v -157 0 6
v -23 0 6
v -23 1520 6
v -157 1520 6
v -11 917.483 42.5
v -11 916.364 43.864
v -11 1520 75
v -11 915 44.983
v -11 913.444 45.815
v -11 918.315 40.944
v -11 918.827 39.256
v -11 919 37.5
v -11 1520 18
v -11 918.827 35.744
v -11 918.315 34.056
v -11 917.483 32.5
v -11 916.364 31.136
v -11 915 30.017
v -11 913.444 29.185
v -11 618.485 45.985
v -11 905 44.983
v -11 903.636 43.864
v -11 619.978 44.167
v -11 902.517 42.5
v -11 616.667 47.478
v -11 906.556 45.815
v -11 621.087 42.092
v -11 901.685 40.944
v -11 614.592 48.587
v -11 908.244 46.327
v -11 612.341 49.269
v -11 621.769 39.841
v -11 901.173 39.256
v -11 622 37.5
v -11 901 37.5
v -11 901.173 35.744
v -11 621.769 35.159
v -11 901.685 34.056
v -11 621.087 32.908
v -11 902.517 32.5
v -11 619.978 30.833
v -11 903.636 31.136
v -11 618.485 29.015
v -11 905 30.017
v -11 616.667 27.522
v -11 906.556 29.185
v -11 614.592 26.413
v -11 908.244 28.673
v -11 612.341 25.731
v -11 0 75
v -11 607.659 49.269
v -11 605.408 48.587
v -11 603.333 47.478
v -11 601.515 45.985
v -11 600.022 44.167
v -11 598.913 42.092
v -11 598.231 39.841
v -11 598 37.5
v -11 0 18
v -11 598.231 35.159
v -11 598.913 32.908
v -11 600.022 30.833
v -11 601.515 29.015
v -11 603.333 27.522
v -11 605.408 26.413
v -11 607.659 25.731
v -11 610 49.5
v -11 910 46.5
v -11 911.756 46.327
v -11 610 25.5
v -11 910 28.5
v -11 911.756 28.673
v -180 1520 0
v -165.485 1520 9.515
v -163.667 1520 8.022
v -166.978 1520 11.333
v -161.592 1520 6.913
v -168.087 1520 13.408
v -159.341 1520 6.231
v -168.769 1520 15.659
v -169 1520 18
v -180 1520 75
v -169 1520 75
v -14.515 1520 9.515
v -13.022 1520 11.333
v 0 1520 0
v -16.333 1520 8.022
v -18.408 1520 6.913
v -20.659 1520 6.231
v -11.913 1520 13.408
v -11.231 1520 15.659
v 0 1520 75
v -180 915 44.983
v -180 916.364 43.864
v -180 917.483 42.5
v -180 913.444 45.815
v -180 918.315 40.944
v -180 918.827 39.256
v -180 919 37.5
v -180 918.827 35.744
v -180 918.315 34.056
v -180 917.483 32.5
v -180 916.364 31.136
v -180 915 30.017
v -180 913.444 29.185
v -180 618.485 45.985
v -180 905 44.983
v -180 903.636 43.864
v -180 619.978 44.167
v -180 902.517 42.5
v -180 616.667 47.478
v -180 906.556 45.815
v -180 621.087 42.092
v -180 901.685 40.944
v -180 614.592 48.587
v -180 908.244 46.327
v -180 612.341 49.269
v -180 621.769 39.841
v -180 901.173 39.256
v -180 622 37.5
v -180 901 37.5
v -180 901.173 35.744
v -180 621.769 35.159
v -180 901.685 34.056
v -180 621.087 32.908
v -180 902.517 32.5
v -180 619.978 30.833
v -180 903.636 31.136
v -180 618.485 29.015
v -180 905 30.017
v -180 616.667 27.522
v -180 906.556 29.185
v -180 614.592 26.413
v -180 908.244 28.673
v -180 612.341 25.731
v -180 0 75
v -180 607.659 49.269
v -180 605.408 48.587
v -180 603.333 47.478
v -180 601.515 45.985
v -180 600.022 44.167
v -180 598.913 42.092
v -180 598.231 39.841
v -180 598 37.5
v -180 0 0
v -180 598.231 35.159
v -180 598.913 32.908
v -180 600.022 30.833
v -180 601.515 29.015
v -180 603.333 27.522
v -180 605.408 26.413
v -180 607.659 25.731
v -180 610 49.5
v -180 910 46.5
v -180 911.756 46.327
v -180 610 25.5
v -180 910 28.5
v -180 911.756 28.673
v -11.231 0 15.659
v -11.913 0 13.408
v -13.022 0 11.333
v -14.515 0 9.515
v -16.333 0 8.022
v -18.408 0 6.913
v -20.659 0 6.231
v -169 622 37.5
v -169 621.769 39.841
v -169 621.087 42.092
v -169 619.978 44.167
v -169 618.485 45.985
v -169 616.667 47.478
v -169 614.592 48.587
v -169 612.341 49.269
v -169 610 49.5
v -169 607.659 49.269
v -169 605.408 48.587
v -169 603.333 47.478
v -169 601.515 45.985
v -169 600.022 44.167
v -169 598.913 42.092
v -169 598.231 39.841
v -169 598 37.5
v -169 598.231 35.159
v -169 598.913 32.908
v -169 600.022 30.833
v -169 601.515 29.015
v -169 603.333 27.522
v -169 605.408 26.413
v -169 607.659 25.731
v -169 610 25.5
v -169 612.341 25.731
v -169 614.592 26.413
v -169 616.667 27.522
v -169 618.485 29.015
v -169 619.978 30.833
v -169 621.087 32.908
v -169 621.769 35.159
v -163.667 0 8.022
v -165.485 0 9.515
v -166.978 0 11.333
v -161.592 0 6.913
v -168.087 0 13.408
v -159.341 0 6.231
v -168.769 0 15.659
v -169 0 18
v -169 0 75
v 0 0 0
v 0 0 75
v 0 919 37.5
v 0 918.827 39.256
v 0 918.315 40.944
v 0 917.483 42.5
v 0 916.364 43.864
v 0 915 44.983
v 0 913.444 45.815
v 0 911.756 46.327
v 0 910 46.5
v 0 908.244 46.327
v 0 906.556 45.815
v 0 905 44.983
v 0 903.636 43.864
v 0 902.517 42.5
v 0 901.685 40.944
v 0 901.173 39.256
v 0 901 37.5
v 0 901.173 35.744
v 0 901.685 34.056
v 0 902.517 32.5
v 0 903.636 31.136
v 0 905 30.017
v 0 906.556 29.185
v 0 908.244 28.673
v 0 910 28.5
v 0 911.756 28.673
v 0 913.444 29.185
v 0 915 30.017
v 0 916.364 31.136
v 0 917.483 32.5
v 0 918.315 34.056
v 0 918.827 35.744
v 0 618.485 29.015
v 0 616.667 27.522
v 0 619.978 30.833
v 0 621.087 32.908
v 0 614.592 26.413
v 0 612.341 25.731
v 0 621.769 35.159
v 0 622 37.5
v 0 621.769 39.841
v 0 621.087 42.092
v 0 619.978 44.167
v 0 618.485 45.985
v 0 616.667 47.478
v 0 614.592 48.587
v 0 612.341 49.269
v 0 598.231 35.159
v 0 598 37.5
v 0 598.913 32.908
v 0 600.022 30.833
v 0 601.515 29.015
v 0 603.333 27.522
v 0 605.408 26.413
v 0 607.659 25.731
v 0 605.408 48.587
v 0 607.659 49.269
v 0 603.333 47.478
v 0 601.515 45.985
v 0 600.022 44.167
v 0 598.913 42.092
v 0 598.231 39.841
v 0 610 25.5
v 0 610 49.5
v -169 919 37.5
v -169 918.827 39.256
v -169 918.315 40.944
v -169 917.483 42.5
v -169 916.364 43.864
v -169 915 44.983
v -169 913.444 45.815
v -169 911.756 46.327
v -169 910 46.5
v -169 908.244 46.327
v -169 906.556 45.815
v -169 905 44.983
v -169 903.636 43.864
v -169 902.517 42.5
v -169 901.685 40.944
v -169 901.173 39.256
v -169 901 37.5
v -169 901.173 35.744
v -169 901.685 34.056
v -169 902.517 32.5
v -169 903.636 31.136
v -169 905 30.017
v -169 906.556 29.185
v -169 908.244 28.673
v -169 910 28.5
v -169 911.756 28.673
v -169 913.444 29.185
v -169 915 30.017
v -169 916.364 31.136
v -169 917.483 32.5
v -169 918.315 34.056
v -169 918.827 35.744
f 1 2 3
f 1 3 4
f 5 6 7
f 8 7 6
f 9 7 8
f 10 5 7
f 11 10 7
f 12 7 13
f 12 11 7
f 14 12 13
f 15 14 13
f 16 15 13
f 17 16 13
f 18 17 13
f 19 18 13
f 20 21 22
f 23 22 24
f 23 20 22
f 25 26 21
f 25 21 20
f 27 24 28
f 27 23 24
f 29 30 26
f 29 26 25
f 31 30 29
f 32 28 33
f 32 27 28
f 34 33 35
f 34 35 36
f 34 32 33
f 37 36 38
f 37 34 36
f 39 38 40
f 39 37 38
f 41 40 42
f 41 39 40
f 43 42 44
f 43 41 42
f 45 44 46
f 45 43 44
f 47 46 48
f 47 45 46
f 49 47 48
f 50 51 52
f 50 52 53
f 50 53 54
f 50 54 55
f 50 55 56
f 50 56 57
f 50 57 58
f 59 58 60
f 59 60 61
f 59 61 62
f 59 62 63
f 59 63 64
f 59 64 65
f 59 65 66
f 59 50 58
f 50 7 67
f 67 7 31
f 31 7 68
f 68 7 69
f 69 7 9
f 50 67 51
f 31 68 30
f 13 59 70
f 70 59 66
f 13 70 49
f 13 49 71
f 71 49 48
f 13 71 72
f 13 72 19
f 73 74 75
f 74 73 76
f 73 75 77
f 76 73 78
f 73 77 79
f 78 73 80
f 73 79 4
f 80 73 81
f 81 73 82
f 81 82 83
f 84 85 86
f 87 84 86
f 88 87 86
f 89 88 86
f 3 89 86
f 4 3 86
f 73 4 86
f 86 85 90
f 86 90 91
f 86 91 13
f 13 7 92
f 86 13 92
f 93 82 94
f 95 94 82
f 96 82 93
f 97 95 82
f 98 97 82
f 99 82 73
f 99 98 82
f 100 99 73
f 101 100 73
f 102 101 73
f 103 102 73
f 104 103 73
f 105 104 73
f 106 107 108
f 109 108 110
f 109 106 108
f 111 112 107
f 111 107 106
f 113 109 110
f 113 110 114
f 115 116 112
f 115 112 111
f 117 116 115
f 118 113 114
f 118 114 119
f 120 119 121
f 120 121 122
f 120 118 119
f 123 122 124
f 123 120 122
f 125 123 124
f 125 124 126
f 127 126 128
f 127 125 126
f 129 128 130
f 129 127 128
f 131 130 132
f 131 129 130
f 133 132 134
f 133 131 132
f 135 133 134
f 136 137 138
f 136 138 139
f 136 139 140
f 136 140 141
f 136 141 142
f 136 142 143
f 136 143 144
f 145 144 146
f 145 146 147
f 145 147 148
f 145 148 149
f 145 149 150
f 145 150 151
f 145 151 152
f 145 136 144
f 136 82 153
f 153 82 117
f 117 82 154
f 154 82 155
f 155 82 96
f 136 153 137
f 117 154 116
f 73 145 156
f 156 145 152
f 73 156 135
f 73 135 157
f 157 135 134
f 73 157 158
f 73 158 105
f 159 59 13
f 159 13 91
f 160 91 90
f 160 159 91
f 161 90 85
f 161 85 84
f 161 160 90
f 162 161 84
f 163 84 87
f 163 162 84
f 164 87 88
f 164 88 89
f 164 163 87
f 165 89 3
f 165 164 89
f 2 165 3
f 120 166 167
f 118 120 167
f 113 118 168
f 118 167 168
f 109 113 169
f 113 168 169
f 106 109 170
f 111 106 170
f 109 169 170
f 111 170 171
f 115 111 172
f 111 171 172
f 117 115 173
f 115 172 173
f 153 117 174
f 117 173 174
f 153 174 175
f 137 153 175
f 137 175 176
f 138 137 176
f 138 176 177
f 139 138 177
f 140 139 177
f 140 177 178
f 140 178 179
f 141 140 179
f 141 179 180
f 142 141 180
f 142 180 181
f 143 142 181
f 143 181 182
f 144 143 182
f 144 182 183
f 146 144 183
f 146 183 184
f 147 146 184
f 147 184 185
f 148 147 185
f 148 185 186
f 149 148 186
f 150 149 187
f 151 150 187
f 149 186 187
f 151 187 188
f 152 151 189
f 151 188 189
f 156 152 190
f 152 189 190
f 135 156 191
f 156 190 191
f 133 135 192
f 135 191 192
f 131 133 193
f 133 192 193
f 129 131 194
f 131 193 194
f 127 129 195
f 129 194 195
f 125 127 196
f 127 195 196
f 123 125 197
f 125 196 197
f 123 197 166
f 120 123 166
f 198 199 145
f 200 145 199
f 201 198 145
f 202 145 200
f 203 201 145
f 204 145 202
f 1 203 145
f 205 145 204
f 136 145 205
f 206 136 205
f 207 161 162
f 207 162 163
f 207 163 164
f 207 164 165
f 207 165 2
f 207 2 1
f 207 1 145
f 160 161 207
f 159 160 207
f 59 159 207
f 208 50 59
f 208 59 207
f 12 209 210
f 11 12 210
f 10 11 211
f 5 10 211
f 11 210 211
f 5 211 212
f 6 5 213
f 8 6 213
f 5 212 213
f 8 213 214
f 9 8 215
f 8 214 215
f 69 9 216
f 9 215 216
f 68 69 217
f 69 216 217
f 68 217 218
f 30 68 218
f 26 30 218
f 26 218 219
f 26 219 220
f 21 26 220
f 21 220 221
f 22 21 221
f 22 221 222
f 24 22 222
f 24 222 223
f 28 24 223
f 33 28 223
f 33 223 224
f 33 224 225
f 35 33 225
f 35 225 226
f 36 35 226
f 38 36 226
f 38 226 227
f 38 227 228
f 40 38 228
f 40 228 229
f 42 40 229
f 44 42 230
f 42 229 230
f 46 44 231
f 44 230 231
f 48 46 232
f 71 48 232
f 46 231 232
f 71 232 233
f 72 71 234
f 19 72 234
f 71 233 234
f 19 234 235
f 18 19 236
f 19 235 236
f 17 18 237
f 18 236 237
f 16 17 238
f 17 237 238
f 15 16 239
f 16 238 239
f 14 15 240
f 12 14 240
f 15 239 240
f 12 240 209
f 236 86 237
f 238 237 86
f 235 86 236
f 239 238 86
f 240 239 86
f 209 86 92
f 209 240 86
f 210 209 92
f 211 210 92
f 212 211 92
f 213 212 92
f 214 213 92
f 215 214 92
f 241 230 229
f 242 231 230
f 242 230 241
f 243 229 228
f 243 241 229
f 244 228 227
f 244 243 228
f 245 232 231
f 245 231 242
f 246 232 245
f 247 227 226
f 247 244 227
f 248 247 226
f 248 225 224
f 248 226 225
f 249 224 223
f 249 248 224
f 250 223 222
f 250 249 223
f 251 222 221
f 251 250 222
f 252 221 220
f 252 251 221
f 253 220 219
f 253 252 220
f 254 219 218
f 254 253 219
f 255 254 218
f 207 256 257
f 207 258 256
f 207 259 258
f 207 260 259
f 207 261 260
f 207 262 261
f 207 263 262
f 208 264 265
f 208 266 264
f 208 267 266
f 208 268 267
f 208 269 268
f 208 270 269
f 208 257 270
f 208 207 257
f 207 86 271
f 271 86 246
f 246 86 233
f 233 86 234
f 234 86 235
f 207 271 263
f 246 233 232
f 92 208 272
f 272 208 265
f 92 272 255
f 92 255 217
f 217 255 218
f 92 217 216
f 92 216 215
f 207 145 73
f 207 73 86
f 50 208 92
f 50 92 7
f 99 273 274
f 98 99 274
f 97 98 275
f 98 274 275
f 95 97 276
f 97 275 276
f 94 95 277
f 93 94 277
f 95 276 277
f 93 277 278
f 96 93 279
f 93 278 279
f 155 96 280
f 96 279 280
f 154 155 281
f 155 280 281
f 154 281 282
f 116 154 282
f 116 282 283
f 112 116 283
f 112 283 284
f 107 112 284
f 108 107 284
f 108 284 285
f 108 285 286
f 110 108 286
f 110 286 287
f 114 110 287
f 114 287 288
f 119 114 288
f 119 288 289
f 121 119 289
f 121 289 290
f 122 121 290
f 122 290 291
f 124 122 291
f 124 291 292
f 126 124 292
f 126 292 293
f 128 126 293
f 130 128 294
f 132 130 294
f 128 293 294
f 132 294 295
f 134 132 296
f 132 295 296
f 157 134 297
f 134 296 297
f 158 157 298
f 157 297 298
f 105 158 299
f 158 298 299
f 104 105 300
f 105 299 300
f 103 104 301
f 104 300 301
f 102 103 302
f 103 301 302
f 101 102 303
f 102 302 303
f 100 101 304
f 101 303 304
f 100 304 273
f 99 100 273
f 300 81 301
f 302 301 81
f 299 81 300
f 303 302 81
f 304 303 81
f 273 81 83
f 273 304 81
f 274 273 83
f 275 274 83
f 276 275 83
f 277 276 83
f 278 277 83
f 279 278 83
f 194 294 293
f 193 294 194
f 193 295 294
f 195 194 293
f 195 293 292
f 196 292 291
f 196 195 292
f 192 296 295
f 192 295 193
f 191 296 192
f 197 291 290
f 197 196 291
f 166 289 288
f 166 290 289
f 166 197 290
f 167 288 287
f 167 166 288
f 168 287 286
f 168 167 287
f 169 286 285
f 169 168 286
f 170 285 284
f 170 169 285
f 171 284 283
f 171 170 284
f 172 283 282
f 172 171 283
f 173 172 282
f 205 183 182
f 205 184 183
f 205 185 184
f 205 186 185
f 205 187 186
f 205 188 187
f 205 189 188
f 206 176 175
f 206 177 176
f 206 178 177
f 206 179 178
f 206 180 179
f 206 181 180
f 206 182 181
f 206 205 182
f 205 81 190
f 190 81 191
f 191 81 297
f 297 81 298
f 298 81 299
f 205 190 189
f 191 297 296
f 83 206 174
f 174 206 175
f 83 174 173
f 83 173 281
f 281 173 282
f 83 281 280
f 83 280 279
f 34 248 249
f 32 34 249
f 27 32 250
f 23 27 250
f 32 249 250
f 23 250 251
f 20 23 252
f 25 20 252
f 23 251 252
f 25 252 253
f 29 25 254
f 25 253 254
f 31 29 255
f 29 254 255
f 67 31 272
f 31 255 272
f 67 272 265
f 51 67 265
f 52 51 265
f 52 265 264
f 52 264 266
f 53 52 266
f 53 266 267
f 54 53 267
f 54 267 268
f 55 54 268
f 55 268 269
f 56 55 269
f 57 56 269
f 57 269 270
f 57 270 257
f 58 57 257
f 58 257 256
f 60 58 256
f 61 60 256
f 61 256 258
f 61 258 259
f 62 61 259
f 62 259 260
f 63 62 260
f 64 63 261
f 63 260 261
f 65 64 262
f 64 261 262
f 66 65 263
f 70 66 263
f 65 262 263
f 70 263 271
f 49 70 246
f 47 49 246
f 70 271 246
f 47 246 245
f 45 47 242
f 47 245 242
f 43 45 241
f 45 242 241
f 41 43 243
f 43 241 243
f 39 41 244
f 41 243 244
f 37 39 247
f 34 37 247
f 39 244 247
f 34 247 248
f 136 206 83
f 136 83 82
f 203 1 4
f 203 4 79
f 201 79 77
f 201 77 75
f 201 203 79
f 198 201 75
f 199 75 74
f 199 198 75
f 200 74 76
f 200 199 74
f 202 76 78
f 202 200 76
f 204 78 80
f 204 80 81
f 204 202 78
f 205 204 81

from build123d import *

# Parameters (mm, degrees)
F1_DEPTH = 1520
F2_R     = 9
F2_R_2   = 12
F3_DEPTH = 180


with BuildPart() as f1:
    # F0 (on Front) → F1 (new body)
    with BuildSketch(Plane.XZ):
        with BuildLine():
            Line((-180, 0), (0, 0))
            Line((0, 0), (0, 75))
            Line((0, 75), (-11, 75))
            Line((-11, 75), (-11, 18))
            ThreePointArc((-11, 18), (-14.514719, 9.514719), (-23, 6))
            Line((-23, 6), (-157, 6))
            ThreePointArc((-157, 6), (-165.485281, 9.514719), (-169, 18))
            Line((-169, 18), (-169, 75))
            Line((-169, 75), (-180, 75))
            Line((-180, 75), (-180, 0))
        make_face()
    extrude(amount=-F1_DEPTH)

    # F2 (on face) → F3 (cut)
    with BuildSketch(Plane.YZ):
        with Locations((910, 37.5)):
            Circle(F2_R)
        with Locations((610, 37.5)):
            Circle(F2_R_2)
    extrude(amount=-F3_DEPTH, mode=Mode.SUBTRACT)


solid = f1.part
